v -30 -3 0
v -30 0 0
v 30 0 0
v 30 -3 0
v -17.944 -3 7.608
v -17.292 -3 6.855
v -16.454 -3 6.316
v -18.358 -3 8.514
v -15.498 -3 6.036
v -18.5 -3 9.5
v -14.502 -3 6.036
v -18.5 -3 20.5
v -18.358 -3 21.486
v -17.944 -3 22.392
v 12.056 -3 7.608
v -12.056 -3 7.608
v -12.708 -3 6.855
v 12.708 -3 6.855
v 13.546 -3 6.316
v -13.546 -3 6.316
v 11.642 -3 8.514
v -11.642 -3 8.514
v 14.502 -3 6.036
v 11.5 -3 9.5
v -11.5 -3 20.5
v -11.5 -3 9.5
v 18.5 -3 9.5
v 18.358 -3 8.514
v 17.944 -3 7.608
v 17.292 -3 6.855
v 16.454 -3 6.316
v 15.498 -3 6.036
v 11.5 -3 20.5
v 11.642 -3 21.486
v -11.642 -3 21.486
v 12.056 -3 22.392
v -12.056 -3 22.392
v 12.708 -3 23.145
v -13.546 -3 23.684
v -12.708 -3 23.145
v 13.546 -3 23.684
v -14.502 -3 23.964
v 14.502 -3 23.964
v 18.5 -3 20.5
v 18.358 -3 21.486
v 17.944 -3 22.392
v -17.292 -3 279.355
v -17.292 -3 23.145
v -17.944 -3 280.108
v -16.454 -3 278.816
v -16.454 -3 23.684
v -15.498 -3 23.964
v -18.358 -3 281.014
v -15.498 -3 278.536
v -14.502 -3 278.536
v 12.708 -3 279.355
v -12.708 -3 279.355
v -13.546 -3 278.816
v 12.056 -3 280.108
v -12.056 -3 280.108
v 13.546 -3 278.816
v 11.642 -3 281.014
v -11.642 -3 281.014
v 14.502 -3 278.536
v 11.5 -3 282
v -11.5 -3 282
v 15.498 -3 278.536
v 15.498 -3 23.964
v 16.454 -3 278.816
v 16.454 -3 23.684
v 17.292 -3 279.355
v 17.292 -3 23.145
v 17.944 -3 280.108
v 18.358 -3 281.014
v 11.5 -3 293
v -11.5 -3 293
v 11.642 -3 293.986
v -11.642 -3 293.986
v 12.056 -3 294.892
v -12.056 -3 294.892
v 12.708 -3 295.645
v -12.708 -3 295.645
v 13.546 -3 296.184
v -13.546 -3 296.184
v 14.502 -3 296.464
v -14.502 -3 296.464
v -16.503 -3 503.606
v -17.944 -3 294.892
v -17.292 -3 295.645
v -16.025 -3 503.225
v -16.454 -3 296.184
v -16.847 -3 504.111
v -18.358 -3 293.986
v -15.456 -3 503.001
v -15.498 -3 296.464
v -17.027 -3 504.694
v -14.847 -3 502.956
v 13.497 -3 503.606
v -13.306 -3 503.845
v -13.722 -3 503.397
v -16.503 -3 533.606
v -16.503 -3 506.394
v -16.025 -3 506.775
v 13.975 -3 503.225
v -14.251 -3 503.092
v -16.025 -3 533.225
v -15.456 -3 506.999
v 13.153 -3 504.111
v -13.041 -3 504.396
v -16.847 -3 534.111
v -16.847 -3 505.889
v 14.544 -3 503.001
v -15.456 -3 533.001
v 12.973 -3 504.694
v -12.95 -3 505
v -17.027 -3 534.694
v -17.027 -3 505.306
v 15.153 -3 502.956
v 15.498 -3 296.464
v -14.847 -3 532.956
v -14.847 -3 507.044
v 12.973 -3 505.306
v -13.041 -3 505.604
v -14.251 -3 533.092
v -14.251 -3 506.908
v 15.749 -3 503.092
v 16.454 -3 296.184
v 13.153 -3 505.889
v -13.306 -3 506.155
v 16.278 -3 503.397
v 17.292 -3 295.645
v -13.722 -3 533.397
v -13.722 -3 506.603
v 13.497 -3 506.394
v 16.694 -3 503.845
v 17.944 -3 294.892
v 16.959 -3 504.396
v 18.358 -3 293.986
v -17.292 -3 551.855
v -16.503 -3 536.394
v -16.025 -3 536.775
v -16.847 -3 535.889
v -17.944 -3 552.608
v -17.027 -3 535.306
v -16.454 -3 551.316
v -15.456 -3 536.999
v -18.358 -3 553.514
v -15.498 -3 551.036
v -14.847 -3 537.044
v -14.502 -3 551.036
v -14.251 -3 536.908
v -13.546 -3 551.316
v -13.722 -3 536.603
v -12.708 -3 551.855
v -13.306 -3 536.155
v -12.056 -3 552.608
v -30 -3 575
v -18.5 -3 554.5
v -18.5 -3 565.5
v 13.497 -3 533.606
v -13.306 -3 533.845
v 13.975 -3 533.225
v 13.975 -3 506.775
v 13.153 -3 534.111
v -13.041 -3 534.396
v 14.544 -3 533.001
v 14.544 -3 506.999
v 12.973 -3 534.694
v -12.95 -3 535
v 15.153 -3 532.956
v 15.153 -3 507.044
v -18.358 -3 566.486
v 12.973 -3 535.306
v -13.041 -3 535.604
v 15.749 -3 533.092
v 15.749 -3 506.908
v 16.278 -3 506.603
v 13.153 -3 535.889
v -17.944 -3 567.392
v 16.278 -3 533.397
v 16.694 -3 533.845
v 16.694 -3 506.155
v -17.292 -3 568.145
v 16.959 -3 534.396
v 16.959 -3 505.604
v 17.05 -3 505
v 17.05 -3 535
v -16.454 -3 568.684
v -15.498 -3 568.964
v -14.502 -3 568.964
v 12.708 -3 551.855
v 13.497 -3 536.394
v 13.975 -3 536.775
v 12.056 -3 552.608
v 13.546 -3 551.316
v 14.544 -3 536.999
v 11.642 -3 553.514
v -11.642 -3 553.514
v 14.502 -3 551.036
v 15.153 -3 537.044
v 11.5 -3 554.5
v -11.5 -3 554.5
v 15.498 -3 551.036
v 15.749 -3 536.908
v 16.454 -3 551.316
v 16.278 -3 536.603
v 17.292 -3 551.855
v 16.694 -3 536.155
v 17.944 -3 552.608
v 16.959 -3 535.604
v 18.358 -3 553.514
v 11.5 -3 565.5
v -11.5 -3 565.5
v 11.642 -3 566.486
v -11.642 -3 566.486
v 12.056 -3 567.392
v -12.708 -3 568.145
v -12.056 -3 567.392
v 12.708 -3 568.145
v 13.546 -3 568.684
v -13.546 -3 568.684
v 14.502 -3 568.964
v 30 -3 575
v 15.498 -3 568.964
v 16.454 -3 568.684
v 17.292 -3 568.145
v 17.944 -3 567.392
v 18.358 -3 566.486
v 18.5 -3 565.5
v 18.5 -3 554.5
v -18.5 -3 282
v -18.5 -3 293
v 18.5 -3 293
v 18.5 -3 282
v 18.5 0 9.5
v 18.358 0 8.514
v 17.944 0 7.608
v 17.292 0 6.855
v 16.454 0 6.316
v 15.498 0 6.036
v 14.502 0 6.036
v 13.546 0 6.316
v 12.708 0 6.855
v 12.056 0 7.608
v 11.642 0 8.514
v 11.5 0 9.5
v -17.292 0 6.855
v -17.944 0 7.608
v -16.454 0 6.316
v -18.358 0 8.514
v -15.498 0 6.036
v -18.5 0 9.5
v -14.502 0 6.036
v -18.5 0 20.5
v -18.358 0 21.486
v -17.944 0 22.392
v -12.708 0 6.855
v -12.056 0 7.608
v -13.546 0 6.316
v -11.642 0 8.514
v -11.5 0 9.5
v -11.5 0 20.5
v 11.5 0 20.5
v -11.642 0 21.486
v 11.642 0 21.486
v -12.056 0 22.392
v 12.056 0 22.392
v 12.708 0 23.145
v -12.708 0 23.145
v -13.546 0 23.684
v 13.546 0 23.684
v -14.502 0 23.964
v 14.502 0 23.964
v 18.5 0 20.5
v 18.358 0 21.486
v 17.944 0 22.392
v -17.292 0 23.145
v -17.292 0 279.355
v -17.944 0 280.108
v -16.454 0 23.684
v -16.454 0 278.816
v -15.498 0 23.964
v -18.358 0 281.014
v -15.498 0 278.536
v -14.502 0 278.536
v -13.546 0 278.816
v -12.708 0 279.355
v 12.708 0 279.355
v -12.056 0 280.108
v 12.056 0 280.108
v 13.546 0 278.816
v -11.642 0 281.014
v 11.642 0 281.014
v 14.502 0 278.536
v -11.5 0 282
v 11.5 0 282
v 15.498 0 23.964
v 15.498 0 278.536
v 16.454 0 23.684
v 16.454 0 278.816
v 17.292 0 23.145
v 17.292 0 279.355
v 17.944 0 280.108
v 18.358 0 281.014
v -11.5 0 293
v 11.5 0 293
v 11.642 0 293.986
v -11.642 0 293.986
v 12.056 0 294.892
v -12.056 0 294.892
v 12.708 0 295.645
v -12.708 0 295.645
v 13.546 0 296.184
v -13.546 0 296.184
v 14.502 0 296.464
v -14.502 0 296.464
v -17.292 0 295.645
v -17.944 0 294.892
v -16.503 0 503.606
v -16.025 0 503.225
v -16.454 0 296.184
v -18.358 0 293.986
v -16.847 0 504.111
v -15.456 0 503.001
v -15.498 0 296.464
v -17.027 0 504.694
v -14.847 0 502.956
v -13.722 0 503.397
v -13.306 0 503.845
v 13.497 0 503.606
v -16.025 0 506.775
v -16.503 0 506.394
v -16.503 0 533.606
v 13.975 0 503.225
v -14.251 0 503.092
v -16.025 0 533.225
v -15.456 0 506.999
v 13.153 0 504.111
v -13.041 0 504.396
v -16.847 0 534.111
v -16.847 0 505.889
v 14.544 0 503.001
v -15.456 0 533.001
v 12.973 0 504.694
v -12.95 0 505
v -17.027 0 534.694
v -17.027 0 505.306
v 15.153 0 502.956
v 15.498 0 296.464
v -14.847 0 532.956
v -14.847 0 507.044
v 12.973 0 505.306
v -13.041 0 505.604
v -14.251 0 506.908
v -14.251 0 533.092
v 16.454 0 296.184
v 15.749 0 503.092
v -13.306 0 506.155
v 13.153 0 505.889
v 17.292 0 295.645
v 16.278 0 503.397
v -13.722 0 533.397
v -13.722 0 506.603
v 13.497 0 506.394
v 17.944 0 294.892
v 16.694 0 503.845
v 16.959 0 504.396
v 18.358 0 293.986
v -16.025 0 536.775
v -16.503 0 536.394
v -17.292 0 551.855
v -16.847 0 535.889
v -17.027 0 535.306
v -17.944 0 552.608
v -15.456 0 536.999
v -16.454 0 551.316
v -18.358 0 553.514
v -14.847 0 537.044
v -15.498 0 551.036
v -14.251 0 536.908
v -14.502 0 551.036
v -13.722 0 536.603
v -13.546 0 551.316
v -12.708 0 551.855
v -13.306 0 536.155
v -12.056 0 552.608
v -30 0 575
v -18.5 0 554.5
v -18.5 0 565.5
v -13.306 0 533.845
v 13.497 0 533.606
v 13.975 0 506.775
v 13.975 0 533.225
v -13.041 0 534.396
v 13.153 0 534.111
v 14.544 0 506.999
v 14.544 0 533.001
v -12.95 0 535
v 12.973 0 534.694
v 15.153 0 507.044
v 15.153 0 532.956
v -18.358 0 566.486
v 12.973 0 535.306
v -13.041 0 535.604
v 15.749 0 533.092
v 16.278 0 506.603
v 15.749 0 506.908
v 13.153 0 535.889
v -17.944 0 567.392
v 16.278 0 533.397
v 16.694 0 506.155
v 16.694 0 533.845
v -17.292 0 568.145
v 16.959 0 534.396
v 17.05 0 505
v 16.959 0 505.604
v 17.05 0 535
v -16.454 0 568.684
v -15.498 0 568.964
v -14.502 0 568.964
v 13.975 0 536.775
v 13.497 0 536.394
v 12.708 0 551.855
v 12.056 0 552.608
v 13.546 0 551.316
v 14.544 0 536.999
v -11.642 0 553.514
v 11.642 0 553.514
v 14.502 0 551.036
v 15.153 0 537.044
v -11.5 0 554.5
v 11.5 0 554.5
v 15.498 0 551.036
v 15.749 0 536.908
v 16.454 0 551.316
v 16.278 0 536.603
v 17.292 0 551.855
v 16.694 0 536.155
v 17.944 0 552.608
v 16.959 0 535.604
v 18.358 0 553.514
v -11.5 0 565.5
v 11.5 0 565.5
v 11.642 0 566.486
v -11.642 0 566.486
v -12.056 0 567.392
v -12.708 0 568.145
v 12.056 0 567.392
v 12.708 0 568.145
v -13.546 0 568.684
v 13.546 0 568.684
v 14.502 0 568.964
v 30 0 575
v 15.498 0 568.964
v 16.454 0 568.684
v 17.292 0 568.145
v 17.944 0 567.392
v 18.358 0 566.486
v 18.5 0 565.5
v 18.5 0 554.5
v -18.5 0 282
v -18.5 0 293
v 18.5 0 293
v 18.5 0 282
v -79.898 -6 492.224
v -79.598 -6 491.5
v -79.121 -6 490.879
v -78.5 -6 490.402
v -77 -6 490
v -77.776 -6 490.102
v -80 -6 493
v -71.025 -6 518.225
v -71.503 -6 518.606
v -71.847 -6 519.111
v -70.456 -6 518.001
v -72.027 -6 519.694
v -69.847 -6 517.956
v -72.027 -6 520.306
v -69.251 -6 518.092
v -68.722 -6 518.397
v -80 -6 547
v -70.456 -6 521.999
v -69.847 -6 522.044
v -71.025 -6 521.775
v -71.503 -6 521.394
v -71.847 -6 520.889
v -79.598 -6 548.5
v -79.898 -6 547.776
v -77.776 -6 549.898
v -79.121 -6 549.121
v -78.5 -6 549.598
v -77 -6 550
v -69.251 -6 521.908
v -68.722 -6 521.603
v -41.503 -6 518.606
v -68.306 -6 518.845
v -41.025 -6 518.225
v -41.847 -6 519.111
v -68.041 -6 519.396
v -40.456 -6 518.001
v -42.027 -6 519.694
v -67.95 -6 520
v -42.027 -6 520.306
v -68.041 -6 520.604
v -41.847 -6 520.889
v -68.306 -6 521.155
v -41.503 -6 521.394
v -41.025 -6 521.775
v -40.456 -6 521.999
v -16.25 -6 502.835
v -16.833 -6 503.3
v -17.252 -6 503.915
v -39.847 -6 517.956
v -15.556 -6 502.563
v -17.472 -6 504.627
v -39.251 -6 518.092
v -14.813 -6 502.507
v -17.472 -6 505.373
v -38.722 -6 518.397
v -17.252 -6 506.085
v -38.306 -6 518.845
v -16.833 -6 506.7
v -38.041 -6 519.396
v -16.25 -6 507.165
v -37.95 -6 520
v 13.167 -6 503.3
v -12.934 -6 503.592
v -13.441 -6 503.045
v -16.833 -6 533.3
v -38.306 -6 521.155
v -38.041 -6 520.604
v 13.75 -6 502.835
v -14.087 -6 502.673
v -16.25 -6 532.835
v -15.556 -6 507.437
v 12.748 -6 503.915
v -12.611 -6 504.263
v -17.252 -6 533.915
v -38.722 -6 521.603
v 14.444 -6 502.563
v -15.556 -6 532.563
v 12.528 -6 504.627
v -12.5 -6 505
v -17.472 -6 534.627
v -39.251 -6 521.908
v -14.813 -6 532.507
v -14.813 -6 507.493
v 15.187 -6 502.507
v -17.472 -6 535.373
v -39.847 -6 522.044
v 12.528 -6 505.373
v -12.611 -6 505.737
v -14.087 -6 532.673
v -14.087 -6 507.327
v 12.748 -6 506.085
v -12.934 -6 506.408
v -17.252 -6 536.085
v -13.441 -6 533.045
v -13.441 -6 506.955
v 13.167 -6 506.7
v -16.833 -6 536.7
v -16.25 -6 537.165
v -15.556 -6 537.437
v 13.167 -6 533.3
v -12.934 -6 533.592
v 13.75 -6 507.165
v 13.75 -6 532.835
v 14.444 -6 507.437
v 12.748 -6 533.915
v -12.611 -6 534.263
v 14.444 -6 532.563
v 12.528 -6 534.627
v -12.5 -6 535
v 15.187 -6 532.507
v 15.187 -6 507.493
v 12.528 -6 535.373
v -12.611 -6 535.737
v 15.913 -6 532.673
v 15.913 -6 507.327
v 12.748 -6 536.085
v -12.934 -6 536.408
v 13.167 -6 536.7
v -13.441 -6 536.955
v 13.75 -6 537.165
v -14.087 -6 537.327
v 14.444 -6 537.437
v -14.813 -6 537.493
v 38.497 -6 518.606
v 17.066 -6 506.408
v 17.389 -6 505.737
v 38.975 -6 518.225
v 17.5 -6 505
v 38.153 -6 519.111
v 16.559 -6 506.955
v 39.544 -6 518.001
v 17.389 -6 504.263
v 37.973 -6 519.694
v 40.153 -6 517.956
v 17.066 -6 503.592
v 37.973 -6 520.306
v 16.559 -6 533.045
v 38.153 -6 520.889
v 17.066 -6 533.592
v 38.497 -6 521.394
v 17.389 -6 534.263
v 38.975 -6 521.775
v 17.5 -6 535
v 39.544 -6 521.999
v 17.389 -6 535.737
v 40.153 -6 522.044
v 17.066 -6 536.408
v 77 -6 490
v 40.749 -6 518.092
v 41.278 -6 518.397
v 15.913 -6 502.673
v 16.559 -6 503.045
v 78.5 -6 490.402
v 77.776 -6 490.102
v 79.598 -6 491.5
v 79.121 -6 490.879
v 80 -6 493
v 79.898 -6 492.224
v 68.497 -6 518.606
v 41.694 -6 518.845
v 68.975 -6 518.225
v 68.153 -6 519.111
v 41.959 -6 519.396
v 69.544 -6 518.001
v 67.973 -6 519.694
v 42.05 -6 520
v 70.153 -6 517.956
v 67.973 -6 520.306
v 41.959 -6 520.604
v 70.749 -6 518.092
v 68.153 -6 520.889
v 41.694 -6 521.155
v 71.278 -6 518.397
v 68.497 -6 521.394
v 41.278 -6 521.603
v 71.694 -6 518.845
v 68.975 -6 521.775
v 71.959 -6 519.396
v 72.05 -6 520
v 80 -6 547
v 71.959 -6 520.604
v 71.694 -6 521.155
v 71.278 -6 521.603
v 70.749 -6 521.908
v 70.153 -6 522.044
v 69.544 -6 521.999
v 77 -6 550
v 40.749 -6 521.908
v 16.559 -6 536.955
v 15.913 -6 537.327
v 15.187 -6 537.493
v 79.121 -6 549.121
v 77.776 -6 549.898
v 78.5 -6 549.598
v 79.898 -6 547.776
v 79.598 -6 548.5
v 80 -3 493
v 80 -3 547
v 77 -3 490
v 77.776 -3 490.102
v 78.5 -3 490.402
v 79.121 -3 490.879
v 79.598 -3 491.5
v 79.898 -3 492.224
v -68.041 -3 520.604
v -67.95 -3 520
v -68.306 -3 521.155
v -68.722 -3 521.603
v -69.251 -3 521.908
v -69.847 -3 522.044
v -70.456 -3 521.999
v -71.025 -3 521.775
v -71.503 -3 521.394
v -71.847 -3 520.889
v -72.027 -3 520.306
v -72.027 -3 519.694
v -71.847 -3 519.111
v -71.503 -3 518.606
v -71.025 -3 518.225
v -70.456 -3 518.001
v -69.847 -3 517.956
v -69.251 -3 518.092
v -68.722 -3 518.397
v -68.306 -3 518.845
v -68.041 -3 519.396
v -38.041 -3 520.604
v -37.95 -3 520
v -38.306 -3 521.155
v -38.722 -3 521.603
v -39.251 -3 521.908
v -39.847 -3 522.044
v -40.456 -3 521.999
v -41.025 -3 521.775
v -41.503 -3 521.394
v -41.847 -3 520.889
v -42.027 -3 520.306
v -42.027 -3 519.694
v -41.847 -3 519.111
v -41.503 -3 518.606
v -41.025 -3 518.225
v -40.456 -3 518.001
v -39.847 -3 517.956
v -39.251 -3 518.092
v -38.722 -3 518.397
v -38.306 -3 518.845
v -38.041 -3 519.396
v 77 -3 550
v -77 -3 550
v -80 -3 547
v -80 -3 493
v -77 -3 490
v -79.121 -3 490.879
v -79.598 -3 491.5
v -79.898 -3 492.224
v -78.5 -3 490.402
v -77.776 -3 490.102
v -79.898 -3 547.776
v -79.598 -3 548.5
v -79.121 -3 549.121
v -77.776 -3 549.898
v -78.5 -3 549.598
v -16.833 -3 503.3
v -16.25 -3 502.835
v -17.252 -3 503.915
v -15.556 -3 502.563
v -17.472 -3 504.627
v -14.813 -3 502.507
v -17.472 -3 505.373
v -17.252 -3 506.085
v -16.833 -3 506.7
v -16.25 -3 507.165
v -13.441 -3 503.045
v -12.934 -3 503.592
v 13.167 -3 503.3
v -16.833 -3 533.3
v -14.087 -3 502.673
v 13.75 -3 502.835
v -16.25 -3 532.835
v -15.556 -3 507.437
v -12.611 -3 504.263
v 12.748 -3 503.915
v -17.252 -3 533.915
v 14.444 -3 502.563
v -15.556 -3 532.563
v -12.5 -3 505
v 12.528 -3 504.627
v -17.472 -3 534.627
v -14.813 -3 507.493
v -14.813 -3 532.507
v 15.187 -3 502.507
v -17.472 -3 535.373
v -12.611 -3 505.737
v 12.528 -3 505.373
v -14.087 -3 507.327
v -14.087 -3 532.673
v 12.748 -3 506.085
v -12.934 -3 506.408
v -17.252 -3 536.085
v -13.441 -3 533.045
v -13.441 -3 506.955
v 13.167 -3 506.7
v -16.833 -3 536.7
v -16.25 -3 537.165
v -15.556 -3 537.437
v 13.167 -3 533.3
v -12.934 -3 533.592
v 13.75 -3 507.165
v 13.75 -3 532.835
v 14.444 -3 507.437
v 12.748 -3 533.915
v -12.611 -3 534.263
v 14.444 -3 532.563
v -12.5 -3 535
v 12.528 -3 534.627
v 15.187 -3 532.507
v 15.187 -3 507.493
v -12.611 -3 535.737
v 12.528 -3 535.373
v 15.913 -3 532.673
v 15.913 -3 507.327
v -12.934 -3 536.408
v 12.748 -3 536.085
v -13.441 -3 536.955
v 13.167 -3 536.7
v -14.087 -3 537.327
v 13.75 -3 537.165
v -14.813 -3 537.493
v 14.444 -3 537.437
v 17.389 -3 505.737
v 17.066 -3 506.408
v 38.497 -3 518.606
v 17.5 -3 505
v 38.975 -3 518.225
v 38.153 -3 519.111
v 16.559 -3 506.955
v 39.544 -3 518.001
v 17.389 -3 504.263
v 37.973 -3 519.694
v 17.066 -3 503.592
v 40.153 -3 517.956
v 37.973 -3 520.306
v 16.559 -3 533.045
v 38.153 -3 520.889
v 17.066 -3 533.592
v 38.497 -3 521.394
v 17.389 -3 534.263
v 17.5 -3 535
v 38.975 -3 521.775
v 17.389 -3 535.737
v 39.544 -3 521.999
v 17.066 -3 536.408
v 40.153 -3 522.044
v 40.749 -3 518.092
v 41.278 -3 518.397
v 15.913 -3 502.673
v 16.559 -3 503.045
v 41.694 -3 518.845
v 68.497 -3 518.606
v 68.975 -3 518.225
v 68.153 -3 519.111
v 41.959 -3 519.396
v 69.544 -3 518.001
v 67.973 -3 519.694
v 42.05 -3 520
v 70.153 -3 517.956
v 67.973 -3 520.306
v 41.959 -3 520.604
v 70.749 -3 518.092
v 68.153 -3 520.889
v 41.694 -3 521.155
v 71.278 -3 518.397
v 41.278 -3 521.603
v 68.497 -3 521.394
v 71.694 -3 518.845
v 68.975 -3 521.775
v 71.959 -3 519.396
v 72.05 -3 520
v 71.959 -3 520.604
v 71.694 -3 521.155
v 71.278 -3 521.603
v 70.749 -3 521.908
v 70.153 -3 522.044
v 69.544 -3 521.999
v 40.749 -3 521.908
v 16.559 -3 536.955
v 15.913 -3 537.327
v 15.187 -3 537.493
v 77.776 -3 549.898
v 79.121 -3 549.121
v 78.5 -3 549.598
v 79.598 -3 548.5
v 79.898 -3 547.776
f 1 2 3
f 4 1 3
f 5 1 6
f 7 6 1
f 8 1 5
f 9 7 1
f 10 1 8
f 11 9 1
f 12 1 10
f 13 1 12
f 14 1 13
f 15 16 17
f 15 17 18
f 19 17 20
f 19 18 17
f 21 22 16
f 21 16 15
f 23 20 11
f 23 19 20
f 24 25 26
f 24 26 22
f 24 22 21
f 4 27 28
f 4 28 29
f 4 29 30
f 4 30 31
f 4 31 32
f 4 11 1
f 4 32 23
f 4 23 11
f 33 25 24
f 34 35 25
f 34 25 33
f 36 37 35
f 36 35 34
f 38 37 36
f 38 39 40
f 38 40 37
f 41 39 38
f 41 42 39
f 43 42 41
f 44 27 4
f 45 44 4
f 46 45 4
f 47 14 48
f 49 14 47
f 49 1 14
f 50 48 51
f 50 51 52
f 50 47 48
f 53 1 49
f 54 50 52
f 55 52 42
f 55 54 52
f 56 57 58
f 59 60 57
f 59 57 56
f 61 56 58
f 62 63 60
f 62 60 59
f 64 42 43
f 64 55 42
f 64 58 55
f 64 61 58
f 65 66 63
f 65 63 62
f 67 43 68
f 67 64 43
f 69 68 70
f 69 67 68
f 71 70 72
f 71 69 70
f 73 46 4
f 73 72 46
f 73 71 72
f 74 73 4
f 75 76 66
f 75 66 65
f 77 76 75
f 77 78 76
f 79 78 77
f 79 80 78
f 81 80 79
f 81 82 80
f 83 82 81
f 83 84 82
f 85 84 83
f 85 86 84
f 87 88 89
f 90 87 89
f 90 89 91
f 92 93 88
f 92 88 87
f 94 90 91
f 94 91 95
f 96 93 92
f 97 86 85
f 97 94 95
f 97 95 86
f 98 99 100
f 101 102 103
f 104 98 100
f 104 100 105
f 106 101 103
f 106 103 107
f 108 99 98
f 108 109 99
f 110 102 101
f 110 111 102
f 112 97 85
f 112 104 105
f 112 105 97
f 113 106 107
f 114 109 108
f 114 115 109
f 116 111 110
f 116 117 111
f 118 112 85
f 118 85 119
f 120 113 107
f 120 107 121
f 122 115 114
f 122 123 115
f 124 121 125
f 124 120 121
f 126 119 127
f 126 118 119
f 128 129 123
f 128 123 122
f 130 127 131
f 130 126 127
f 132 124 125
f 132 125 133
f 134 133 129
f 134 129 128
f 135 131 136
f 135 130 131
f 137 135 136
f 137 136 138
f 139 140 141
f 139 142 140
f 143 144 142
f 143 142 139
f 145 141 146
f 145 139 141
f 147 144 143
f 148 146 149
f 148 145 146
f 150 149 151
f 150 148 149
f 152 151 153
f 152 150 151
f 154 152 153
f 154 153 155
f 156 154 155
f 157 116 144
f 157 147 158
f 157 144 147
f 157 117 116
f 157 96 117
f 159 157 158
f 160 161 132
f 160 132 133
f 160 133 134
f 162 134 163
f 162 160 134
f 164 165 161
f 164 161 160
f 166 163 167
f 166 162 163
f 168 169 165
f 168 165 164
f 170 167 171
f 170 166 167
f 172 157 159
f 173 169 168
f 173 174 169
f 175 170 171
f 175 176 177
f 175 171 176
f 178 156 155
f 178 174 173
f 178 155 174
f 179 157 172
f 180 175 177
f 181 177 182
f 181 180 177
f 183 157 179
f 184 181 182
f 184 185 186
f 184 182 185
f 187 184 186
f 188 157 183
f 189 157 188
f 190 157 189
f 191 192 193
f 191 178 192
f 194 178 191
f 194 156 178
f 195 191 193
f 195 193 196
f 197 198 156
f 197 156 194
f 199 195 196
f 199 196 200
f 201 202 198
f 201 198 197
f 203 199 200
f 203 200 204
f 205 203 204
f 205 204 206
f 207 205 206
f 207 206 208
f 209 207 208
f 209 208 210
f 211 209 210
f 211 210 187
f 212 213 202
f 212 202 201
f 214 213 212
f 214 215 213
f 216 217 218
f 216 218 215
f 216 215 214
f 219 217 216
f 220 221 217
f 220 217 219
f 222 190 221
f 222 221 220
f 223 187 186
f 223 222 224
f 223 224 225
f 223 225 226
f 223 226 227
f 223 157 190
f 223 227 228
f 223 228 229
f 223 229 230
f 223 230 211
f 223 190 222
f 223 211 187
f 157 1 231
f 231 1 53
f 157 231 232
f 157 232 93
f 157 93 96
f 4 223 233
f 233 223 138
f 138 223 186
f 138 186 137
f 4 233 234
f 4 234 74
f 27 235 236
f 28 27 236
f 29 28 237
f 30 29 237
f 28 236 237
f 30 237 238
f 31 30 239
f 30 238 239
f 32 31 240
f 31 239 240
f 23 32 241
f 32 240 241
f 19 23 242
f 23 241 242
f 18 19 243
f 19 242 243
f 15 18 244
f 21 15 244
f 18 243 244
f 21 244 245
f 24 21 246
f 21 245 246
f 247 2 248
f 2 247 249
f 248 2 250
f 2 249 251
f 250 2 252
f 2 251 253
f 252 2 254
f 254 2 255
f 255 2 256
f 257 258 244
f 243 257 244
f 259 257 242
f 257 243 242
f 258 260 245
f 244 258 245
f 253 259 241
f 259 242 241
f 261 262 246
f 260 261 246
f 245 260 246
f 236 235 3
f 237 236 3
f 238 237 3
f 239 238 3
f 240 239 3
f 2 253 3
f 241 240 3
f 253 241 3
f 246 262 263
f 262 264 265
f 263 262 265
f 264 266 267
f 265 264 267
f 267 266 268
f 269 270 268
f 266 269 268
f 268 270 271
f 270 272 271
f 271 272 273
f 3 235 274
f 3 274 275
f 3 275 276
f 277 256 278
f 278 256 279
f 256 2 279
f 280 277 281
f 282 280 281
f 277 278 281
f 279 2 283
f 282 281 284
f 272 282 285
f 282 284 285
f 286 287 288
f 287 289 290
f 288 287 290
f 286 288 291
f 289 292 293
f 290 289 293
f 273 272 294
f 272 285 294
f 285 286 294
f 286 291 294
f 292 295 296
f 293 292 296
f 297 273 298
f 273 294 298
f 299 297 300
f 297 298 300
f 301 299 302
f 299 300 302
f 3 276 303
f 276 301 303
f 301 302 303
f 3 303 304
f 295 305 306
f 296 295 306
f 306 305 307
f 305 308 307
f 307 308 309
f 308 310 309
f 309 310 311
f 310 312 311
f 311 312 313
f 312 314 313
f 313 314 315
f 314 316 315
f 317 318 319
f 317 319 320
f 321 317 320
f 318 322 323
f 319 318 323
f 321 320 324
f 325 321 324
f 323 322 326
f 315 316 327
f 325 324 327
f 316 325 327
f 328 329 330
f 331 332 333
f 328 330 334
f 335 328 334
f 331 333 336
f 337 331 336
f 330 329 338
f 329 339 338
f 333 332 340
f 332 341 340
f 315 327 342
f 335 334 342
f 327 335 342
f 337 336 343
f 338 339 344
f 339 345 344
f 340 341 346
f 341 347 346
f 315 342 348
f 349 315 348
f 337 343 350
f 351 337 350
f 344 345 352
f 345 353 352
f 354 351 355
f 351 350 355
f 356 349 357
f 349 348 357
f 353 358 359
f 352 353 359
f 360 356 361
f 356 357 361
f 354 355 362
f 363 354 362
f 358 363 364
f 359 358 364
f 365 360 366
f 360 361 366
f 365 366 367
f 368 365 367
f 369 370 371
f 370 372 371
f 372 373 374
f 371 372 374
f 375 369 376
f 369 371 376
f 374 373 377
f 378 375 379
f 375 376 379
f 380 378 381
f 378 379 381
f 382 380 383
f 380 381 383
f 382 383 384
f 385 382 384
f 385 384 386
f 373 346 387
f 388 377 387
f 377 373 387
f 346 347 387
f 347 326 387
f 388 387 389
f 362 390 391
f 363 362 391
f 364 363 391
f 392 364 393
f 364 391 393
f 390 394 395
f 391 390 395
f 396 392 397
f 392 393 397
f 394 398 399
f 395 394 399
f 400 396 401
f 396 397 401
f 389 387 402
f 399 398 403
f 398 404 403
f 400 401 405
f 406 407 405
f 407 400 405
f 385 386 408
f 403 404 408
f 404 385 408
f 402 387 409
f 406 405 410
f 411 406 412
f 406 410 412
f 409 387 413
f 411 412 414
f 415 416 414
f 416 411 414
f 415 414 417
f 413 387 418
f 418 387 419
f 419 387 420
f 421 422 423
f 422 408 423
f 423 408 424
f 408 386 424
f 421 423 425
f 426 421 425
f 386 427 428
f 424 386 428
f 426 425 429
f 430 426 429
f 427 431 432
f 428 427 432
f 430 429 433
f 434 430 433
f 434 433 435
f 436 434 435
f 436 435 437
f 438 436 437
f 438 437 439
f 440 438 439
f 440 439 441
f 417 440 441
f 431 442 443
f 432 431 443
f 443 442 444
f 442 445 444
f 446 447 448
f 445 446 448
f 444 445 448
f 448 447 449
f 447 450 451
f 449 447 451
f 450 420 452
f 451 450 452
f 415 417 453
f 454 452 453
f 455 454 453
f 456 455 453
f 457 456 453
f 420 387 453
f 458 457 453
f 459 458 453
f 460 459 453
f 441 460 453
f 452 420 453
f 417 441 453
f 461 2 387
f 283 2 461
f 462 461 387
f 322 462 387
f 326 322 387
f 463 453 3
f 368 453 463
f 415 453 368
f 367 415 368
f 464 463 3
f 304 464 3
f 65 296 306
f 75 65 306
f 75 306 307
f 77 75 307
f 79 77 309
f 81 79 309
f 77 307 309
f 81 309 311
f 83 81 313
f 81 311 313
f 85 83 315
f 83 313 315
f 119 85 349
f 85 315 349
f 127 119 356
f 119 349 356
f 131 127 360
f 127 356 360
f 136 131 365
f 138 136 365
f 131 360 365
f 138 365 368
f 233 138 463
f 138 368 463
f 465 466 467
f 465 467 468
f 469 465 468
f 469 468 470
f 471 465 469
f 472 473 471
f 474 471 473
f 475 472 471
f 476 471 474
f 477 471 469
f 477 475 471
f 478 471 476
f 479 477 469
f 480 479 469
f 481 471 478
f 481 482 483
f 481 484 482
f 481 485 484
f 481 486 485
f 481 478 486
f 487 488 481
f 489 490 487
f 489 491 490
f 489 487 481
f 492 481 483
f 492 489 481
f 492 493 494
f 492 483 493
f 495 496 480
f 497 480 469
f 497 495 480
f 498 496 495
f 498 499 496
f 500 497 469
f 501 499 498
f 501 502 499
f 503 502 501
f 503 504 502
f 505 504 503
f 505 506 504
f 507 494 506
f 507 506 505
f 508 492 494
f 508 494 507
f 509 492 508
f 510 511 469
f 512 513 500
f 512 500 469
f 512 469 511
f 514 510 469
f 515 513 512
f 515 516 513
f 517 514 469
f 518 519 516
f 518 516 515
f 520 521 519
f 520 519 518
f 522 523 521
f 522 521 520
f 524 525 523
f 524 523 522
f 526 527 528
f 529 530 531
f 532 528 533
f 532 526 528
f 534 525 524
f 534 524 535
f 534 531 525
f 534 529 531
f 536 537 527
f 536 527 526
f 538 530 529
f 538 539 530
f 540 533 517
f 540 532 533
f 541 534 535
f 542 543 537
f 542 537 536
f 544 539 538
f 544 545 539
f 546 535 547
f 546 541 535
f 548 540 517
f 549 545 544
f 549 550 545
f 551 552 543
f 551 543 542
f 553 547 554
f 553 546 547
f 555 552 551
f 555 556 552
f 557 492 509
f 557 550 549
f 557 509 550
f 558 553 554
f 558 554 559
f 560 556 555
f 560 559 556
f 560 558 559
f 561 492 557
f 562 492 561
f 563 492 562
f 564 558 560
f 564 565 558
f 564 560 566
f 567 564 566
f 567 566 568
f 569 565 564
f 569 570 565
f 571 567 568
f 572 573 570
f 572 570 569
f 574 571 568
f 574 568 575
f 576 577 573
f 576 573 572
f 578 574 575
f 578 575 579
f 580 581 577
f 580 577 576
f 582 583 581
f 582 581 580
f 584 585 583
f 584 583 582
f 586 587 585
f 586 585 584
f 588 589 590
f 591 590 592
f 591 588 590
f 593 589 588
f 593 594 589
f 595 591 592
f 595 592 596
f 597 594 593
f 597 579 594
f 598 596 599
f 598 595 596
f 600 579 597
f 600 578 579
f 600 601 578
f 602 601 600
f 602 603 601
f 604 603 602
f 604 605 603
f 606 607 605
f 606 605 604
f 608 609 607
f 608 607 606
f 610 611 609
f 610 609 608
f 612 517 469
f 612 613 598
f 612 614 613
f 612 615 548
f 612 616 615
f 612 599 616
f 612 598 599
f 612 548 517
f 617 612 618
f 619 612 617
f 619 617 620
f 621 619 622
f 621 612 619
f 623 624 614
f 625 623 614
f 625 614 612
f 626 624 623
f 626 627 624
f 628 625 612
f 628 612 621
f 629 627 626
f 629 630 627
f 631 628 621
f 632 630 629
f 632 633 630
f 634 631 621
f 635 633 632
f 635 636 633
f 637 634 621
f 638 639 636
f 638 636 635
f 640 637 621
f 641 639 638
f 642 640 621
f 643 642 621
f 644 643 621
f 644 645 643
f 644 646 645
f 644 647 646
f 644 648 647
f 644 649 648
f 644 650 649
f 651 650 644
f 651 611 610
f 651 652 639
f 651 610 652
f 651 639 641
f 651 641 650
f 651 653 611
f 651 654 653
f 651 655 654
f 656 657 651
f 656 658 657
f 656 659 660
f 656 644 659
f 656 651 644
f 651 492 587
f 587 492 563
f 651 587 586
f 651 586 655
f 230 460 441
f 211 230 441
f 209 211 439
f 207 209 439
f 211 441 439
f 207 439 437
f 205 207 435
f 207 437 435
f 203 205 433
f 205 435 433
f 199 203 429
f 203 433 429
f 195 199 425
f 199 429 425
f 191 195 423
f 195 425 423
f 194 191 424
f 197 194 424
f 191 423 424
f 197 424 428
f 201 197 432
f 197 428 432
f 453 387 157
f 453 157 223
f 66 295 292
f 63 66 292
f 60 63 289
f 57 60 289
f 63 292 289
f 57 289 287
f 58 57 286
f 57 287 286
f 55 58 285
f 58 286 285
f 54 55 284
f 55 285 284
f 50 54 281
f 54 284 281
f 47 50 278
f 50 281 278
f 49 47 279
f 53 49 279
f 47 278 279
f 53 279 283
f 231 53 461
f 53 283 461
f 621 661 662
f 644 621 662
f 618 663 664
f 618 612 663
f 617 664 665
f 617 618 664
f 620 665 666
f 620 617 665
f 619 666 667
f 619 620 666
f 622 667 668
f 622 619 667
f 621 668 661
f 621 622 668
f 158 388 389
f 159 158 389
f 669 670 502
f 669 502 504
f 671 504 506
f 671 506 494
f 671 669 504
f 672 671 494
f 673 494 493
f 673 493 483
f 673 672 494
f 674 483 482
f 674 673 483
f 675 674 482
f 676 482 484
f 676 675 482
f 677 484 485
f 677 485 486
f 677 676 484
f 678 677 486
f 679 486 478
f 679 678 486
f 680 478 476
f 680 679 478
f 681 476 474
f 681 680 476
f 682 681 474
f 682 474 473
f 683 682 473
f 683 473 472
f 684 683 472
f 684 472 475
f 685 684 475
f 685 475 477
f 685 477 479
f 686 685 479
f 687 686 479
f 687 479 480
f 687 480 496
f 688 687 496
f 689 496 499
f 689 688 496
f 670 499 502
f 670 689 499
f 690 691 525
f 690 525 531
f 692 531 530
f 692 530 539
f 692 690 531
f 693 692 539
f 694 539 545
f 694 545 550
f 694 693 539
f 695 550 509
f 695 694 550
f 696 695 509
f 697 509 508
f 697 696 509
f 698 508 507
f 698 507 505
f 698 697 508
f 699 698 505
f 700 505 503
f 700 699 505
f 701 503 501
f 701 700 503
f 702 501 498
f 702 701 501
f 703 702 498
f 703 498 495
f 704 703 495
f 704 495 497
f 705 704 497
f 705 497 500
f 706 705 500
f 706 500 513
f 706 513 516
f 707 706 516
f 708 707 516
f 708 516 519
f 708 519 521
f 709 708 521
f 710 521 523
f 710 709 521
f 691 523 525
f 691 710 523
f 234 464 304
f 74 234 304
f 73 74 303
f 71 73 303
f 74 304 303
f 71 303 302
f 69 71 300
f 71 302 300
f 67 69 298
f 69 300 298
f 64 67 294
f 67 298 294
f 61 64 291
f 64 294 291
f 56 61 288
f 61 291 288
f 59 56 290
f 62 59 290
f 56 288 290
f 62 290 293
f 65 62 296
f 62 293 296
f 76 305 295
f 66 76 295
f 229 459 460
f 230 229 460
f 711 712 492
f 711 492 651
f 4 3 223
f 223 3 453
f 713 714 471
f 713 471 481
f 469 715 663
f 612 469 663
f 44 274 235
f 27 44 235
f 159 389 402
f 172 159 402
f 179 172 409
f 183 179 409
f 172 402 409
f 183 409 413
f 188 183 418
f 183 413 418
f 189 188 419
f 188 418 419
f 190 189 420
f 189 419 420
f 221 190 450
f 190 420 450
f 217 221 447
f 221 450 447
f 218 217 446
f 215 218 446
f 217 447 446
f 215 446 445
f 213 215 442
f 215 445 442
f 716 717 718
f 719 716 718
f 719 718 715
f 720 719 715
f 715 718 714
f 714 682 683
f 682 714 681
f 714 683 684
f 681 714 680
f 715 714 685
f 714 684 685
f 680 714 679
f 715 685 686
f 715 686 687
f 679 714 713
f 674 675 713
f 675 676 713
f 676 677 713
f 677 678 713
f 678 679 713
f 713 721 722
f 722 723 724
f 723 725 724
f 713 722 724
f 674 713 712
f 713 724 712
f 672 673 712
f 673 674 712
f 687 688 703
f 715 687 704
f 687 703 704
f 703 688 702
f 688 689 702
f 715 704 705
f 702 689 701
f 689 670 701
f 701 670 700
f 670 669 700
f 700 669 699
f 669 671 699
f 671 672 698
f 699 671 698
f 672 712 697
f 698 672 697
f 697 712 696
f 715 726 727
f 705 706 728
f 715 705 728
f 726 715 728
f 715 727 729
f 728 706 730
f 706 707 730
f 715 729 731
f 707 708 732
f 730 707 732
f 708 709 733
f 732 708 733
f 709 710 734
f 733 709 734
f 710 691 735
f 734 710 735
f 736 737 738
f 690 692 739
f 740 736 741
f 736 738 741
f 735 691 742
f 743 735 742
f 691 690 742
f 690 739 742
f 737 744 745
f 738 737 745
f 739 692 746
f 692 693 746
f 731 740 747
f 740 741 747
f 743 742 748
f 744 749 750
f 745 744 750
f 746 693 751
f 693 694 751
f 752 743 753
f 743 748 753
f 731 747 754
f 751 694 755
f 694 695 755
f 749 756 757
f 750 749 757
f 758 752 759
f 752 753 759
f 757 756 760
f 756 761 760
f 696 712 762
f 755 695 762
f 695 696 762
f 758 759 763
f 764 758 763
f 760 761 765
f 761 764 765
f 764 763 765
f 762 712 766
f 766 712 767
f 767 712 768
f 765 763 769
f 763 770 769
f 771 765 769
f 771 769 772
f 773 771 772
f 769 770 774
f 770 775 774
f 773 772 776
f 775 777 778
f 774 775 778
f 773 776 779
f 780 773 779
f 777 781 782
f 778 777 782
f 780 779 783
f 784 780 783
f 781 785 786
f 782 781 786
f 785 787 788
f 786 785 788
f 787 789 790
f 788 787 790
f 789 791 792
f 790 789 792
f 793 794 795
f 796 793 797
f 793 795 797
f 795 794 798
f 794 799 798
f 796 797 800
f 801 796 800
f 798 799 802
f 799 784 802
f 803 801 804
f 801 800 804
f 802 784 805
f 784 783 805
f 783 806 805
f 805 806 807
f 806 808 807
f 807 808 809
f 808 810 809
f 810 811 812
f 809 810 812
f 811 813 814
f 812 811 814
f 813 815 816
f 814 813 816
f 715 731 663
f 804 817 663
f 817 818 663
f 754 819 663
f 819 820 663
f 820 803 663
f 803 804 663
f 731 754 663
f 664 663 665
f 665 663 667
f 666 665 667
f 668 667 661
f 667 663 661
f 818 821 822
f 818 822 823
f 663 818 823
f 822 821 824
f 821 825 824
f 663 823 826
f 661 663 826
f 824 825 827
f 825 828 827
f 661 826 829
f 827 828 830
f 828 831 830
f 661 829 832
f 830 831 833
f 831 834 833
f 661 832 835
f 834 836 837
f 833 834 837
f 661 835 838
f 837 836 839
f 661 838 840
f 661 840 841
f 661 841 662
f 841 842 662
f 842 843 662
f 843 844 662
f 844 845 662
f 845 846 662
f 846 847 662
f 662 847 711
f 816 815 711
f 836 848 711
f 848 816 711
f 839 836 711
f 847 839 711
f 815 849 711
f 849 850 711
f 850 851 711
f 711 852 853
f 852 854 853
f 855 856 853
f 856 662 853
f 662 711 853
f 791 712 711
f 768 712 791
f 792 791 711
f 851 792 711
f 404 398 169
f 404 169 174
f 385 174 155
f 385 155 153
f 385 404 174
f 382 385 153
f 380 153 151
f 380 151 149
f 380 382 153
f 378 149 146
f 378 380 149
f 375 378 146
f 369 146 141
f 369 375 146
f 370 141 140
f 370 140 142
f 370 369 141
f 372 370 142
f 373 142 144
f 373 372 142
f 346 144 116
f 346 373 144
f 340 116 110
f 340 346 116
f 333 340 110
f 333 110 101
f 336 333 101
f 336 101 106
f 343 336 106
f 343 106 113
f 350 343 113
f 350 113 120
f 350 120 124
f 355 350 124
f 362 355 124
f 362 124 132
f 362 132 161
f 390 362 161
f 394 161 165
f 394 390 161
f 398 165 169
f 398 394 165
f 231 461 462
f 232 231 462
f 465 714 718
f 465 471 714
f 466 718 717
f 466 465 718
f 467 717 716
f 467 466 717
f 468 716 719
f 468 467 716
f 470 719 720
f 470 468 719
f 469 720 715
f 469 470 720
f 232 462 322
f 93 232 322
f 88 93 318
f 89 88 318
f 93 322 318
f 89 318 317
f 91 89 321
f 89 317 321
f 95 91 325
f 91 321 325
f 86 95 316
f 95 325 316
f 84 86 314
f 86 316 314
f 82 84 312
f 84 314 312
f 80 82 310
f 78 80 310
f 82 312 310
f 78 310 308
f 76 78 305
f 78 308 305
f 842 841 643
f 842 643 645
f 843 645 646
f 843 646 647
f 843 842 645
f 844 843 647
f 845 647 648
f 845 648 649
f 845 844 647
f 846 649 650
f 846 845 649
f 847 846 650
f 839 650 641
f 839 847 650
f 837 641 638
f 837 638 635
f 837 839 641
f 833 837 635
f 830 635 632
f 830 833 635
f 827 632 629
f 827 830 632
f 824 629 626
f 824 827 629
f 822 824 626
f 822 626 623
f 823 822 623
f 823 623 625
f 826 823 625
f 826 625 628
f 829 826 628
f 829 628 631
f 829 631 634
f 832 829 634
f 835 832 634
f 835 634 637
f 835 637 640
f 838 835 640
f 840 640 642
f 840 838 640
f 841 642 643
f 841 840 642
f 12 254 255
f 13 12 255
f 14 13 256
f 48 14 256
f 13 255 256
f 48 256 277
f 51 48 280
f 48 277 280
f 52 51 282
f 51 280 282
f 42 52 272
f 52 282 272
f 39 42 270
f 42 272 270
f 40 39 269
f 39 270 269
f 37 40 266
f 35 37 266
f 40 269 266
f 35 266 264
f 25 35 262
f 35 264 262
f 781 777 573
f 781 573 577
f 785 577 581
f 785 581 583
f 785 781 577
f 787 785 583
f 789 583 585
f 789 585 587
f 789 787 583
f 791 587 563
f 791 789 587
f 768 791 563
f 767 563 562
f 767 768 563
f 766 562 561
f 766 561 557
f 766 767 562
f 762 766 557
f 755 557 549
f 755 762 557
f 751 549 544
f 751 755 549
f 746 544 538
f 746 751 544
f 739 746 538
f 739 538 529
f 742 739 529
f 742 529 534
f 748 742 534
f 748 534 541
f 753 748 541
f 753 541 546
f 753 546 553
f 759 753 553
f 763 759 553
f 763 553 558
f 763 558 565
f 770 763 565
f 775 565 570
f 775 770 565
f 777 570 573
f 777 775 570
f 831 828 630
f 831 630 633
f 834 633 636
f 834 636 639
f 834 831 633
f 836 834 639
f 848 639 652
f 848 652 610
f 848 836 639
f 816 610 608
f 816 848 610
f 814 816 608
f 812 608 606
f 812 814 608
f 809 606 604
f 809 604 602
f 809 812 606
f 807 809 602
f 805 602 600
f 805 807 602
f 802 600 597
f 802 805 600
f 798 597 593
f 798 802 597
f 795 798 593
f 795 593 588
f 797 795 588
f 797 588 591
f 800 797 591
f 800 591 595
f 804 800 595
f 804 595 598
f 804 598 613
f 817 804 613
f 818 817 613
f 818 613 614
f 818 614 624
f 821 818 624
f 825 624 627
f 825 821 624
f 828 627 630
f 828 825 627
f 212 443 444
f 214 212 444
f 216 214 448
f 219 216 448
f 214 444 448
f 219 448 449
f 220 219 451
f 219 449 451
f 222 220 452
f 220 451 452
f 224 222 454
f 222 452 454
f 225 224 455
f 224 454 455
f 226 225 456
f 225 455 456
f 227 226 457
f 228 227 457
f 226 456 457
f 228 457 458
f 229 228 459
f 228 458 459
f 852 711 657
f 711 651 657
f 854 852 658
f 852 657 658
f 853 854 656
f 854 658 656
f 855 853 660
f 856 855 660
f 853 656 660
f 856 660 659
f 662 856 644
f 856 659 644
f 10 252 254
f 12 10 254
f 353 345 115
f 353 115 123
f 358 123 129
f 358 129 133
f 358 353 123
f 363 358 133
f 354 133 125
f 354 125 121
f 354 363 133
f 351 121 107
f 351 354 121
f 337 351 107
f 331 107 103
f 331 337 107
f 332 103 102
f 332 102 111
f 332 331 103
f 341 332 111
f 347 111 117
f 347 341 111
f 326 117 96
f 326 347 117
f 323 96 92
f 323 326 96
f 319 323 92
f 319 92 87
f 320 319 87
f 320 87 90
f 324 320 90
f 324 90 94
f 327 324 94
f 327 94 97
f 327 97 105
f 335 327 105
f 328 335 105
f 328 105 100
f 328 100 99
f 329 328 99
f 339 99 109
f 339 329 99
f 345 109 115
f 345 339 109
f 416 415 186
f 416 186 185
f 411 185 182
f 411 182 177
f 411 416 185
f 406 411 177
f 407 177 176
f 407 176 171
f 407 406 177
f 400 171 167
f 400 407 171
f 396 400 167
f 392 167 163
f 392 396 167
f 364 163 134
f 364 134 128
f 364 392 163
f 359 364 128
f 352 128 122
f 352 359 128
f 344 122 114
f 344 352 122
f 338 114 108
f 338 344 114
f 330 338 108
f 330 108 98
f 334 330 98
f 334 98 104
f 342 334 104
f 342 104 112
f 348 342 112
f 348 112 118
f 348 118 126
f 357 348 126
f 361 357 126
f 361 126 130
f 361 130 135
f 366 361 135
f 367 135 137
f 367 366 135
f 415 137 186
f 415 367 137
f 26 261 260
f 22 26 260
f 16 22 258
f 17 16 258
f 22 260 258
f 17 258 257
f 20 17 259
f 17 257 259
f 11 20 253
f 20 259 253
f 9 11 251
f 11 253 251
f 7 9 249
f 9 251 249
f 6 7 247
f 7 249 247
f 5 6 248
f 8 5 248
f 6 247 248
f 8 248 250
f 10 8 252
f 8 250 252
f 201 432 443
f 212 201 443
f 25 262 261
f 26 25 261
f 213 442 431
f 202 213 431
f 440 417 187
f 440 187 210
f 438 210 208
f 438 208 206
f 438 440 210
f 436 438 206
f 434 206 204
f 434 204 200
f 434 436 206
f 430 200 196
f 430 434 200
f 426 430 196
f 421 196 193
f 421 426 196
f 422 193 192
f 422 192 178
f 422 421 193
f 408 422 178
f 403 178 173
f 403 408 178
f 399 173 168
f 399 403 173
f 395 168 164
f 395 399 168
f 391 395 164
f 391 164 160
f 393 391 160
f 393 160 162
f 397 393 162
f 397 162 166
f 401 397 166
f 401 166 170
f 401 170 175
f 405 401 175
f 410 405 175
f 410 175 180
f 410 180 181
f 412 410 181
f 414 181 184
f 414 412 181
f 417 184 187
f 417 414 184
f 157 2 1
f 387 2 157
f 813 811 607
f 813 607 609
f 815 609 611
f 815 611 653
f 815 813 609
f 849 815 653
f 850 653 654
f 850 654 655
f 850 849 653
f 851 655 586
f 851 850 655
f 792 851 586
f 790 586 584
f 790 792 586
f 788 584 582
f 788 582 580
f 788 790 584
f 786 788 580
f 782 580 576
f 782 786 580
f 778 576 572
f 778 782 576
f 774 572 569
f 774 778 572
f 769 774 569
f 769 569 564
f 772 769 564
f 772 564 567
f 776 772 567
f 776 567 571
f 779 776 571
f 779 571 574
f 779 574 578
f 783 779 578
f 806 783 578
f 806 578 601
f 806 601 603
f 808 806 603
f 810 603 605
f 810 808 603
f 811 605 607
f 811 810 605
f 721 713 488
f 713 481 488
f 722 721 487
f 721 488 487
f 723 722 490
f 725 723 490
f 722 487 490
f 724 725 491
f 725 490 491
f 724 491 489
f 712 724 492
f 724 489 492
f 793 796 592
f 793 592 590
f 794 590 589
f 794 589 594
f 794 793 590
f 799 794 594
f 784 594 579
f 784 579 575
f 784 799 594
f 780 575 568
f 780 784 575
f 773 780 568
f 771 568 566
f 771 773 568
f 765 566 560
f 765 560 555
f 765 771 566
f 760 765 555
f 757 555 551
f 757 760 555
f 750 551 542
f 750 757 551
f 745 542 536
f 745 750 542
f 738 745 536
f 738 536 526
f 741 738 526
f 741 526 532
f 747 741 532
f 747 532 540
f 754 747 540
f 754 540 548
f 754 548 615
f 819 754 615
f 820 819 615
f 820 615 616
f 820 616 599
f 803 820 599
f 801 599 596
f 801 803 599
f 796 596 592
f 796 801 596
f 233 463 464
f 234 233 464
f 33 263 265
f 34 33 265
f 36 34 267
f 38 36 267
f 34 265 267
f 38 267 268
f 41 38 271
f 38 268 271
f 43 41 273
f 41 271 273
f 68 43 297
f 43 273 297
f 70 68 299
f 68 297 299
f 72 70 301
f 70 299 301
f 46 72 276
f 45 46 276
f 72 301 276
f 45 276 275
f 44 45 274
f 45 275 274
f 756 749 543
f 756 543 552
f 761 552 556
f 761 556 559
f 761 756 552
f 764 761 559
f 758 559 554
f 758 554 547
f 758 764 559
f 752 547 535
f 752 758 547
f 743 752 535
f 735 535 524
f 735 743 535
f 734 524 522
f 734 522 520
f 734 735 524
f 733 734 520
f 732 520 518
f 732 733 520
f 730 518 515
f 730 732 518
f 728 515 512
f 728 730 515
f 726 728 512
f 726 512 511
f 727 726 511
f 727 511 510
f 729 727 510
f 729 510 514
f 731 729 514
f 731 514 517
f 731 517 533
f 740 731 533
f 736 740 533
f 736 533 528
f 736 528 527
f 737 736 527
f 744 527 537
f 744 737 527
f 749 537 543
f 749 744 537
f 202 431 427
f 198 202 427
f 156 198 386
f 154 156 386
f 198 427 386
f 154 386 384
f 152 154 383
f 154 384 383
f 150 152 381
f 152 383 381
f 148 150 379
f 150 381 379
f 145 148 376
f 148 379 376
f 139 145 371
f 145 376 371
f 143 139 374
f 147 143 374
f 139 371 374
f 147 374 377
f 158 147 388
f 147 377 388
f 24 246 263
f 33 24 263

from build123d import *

# Parameters (mm, degrees)
F0_W     = 60
F0_H     = 575
F0_R     = 2.05
F1_DEPTH = 3
F2_W     = 160
F2_H     = 60
F2_R     = 2.5
F2_R_2   = 2.05
F3_DEPTH = 3
F4_R     = 3


with BuildPart() as f1:
    # F0 (on Front) → F1 (new body)
    with BuildSketch(Plane.XZ):
        with Locations((0, 287.5)):
            Rectangle(F0_W, F0_H)
        with BuildLine():
            Line((-11.5, 20.5), (-11.5, 9.5))
            ThreePointArc((-11.5, 9.5), (-15, 6), (-18.5, 9.5))
            Line((-18.5, 9.5), (-18.5, 20.5))
            ThreePointArc((-18.5, 20.5), (-15, 24), (-11.5, 20.5))
        make_face(mode=Mode.SUBTRACT)
        with BuildLine():
            Line((18.5, 20.5), (18.5, 9.5))
            ThreePointArc((18.5, 9.5), (15, 6), (11.5, 9.5))
            Line((11.5, 9.5), (11.5, 20.5))
            ThreePointArc((11.5, 20.5), (15, 24), (18.5, 20.5))
        make_face(mode=Mode.SUBTRACT)
        with BuildLine():
            Line((-11.5, 293), (-11.5, 282))
            ThreePointArc((-11.5, 282), (-15, 278.5), (-18.5, 282))
            Line((-18.5, 282), (-18.5, 293))
            ThreePointArc((-18.5, 293), (-15, 296.5), (-11.5, 293))
        make_face(mode=Mode.SUBTRACT)
        with Locations((-15, 505)):
            Circle(F0_R, mode=Mode.SUBTRACT)
        with Locations((-15, 535)):
            Circle(F0_R, mode=Mode.SUBTRACT)
        with BuildLine():
            Line((-11.5, 565.5), (-11.5, 554.5))
            ThreePointArc((-11.5, 554.5), (-15, 551), (-18.5, 554.5))
            Line((-18.5, 554.5), (-18.5, 565.5))
            ThreePointArc((-18.5, 565.5), (-15, 569), (-11.5, 565.5))
        make_face(mode=Mode.SUBTRACT)
        with BuildLine():
            Line((18.5, 293), (18.5, 282))
            ThreePointArc((18.5, 282), (15, 278.5), (11.5, 282))
            Line((11.5, 282), (11.5, 293))
            ThreePointArc((11.5, 293), (15, 296.5), (18.5, 293))
        make_face(mode=Mode.SUBTRACT)
        with Locations((15, 505)):
            Circle(F0_R, mode=Mode.SUBTRACT)
        with Locations((15, 535)):
            Circle(F0_R, mode=Mode.SUBTRACT)
        with BuildLine():
            Line((18.5, 565.5), (18.5, 554.5))
            ThreePointArc((18.5, 554.5), (15, 551), (11.5, 554.5))
            Line((11.5, 554.5), (11.5, 565.5))
            ThreePointArc((11.5, 565.5), (15, 569), (18.5, 565.5))
        make_face(mode=Mode.SUBTRACT)
    extrude(amount=F1_DEPTH)


with BuildPart() as f3:
    # F2 (on face) → F3 (new body)
    with BuildSketch(Plane.XZ.offset(3)):
        with Locations((0, 520)):
            Rectangle(F2_W, F2_H)
        with Locations((-15, 505)):
            Circle(F2_R, mode=Mode.SUBTRACT)
        with Locations((15, 505)):
            Circle(F2_R, mode=Mode.SUBTRACT)
        with Locations((-70, 520)):
            Circle(F2_R_2, mode=Mode.SUBTRACT)
        with Locations((-40, 520)):
            Circle(F2_R_2, mode=Mode.SUBTRACT)
        with Locations((-15, 535)):
            Circle(F2_R, mode=Mode.SUBTRACT)
        with Locations((40, 520)):
            Circle(F2_R_2, mode=Mode.SUBTRACT)
        with Locations((70, 520)):
            Circle(F2_R_2, mode=Mode.SUBTRACT)
        with Locations((15, 535)):
            Circle(F2_R, mode=Mode.SUBTRACT)
    extrude(amount=F3_DEPTH)

    # F4
    f4_edges = [f3.edges().sort_by_distance(p)[0] for p in [
        (-80, -4.5, 550),
        (-80, -4.5, 490),
        (80, -4.5, 550),
        (80, -4.5, 490),
    ]]
    fillet(f4_edges, radius=F4_R)


solid = Compound([f1.part, f3.part])
